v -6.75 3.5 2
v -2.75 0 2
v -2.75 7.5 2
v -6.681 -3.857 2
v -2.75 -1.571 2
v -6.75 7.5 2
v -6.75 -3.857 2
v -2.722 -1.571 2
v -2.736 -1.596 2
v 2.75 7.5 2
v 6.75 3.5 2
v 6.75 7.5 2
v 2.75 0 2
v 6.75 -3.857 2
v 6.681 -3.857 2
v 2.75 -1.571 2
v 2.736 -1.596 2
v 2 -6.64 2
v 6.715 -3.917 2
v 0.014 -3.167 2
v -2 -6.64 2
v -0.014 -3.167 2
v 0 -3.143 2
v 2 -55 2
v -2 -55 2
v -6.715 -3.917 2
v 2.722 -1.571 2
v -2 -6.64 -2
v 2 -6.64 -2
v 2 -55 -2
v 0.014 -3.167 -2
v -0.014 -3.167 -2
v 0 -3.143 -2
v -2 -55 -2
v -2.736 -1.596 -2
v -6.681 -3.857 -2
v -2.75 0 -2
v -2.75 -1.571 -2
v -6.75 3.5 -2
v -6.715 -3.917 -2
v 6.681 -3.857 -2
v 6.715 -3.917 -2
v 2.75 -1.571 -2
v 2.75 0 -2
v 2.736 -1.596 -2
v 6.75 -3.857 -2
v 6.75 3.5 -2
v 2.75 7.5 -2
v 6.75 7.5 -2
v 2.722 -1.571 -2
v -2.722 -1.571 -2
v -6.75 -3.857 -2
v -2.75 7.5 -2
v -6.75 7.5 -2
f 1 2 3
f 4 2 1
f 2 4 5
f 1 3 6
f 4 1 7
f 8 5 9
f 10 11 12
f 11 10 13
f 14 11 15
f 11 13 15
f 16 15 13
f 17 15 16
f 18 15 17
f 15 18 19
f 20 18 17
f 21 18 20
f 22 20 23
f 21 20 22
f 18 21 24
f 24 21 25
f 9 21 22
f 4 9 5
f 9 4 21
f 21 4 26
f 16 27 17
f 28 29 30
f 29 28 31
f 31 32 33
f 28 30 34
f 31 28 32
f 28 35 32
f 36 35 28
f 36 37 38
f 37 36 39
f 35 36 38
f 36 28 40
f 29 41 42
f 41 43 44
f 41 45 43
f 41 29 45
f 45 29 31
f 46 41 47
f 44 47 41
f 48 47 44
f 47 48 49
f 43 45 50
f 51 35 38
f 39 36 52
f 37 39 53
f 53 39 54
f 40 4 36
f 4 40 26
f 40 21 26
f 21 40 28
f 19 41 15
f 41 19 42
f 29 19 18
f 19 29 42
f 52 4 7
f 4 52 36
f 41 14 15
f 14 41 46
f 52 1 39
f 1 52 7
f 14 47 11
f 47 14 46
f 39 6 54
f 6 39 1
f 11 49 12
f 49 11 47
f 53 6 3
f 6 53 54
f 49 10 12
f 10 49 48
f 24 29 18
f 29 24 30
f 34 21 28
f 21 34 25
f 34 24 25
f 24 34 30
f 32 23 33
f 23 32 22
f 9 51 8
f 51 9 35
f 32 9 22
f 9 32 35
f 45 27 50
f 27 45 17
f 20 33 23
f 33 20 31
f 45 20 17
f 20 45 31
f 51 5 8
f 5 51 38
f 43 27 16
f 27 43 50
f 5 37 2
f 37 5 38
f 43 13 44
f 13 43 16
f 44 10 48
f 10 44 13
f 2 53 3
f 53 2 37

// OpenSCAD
include <MCAD/shapes.scad>

// http://www.engineersedge.com/iso_hex_head_screw.htm

size = 5.5;
height = 4;

bar_length = 10*size;

wall_size = max(4, size/4);



difference () {
 union () {
  // The outisde of the bit that actually holds the nut.
  rotate(a=30, v=[0, 0, 1])
   hexagon(height=height, size=size+wall_size*2);
  
  translate([0, size, 0])
   rotate(a=90, v=[0, 0, 1])
    cube([wall_size, size+wall_size*2, height], center=true);
  

  // The bar / handle
  translate([0, -bar_length/2, 0])
   cube([wall_size, bar_length, height], center=true);
 }
 
 union() {
  translate([-size/2, 0, -height/2-0.05])
   cube([size, size+wall_size, height+0.1]);

  rotate(a=30, v=[0, 0, 1])
   hexagon(height=height+0.1, size=size);
 }

}
